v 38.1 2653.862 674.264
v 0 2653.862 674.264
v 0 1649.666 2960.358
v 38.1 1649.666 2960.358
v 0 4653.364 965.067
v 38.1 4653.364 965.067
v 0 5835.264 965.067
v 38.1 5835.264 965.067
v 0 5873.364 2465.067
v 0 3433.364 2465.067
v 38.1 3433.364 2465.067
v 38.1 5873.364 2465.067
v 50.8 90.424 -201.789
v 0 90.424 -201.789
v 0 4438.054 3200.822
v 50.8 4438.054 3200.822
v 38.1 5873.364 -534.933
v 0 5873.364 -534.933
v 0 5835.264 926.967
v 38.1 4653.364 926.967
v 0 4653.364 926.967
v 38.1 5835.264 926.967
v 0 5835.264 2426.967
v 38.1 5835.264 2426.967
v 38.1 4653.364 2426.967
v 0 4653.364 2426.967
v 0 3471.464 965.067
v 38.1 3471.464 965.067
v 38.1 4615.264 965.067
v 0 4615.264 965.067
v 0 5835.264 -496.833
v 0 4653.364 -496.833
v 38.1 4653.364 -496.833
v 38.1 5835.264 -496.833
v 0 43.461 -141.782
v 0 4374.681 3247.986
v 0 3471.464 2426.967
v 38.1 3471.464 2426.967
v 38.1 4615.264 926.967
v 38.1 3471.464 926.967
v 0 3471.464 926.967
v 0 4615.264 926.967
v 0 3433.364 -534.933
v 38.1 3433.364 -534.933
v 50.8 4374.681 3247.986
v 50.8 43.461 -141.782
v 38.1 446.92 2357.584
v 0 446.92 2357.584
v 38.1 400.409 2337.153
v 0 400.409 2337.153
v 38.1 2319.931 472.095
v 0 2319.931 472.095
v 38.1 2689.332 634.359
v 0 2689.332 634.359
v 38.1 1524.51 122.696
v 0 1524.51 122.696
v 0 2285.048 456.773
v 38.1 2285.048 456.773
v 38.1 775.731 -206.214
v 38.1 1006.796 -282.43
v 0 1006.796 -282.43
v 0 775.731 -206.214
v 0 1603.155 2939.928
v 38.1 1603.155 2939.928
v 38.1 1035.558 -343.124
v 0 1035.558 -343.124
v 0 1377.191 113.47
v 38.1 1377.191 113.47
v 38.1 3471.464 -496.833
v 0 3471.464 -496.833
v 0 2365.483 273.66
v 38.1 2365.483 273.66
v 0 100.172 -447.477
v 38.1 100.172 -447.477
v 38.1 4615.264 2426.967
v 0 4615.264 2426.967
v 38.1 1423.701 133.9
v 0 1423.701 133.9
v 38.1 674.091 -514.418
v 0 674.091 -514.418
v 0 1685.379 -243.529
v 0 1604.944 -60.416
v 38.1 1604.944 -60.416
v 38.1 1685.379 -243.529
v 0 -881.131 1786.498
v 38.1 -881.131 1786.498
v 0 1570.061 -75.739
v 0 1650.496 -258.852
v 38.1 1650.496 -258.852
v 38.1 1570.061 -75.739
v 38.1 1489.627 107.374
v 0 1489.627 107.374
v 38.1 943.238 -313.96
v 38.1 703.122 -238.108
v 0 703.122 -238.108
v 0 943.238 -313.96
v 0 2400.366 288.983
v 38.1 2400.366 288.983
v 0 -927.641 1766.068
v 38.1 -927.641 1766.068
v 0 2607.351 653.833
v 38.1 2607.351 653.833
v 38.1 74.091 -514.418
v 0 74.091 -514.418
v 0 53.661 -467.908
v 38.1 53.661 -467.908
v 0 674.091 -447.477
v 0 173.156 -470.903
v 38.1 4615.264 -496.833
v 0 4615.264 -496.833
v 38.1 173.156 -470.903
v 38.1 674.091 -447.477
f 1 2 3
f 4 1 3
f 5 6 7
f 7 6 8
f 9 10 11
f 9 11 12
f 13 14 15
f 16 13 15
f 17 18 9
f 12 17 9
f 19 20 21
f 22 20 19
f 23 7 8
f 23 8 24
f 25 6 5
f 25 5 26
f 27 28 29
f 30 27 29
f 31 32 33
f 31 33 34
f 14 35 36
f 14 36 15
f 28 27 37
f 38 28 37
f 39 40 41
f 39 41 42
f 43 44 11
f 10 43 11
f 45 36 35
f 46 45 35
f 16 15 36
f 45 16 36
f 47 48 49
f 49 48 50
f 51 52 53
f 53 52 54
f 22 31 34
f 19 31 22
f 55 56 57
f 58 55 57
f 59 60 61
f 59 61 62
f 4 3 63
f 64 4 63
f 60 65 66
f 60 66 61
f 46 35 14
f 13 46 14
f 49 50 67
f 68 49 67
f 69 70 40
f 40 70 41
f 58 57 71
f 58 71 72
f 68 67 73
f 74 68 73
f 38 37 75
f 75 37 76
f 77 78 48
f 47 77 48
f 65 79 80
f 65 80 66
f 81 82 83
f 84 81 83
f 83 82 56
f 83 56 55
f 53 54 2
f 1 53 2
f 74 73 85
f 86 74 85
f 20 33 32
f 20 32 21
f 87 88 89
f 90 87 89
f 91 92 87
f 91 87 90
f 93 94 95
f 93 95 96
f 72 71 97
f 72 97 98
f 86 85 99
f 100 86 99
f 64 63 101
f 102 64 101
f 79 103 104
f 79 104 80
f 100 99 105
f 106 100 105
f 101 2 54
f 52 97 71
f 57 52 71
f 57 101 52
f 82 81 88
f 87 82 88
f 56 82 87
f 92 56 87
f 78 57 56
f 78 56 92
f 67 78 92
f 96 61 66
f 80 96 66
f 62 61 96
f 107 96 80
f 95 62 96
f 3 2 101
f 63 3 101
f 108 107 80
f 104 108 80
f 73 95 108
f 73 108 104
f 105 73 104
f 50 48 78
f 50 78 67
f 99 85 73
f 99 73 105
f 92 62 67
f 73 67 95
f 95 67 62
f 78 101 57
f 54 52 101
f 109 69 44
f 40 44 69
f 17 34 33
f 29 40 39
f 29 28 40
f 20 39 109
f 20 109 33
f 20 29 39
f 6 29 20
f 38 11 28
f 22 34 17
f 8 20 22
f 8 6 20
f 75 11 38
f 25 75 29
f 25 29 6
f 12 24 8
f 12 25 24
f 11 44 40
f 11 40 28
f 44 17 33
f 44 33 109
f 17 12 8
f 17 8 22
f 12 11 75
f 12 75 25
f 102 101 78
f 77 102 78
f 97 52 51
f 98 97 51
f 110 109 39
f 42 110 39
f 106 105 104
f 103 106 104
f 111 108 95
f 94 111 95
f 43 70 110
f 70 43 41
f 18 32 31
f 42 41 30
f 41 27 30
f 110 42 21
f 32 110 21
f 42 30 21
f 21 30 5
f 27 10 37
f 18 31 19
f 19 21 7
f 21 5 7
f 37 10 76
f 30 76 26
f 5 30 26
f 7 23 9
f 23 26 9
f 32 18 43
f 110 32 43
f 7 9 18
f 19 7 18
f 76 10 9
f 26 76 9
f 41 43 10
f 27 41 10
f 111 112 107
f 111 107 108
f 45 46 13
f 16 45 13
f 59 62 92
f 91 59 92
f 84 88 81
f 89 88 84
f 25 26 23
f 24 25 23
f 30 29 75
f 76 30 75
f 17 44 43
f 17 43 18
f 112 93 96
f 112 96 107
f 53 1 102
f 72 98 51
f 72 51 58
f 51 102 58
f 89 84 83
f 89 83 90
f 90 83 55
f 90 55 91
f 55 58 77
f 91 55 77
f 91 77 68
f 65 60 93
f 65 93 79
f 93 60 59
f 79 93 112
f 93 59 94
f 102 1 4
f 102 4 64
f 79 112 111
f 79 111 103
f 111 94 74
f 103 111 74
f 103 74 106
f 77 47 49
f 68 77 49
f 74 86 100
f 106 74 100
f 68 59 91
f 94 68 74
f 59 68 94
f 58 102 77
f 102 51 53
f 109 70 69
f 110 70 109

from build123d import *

# Parameters (mm, degrees)
F0_W      = 2440
F0_H      = 3000
F0_W_2    = 2363.8
F0_H_2    = 2923.8
F1_DEPTH  = 38.1
F2_W      = 38.1
F2_H      = 3000
F3_DEPTH  = 38.1
F4_W      = 2440
F4_H      = 38.1
F5_DEPTH  = 38.1
F7_DEPTH  = 38.1
F9_DEPTH  = 38.1
F10_DEPTH = 38.1
F11_W     = 38.1
F11_H     = 38.1
F12_DEPTH = 200
F13_W     = 38.1
F13_H     = 38.1
F14_DEPTH = 200
F16_DEPTH = 50.8


# Not quite as in the source:
# - a feature names something its author has since deleted; it is built from what else it names


with BuildPart() as f1:
    # F0 (on Right) → F1 (new body)
    with BuildSketch(Plane.YZ):
        with Locations((4653.3635152385, 965.0668048064)):
            Rectangle(F0_W, F0_H)
        with Locations((4653.3635152385, 965.0668048064)):
            Rectangle(F0_W_2, F0_H_2, mode=Mode.SUBTRACT)
    extrude(amount=F1_DEPTH)

    # F2 (on face) → F3 (join)
    with BuildSketch(Plane.YZ.offset(38.1)):
        with Locations((4634.3135152385, 965.0668048064)):
            Rectangle(F2_W, F2_H)
    extrude(amount=-F3_DEPTH)

    # F4 (on face) → F5 (join)
    with BuildSketch(Plane.YZ.offset(38.1)):
        with Locations((4653.3635152385, 946.0168048064)):
            Rectangle(F4_W, F4_H)
    extrude(amount=-F5_DEPTH)


with BuildPart() as f7:
    # F6 (on Right) → F7 (new body)
    with BuildSketch(Plane.YZ):
        Polygon((74.091359973, -514.4183039665), (2689.3315110135, 634.3592099591), (2653.8618600197, 674.2636581614), (2607.3512244074, 653.8332696449), (1423.7013476008, 133.8999999239), (1377.1907119885, 113.4696114073), (100.1716070687, -447.4772798376), (109.1459151908, -467.9076683542), align=None)
        Polygon((53.6609714564, -467.9076683542), (74.091359973, -514.4183039665), (109.1459151908, -467.9076683542), (100.1716070687, -447.4772798376), align=None)
        Polygon((2607.3512244074, 653.8332696449), (2653.8618600197, 674.2636581614), (1649.6657982272, 2960.358074601), (1603.1551626149, 2939.9276860845), align=None)
        Polygon((-927.6411541415, 1766.0677429467), (53.6609714564, -467.9076683542), (100.1716070687, -447.4772798376), (-881.1305185292, 1786.4981314632), align=None)
        Polygon((1377.1907119885, 113.4696114073), (1423.7013476008, 133.8999999239), (446.9199455077, 2357.5837947211), (400.4093098953, 2337.1534062045), align=None)
    extrude(amount=F7_DEPTH)

    # F8 (on face) → F9 (join)
    with BuildSketch(Plane.YZ.offset(38.1)):
        Polygon((943.2376147162, -313.9598791054), (1035.5579565697, -343.1235301269), (1006.796002388, -282.4299931526), align=None)
        Polygon((173.1557213069, -470.9030227077), (74.091359973, -514.4183039665), (674.091359973, -514.4183039665), (674.091359973, -447.4772798376), align=None)
        Polygon((674.091359973, -447.4772798376), (674.091359973, -514.4183039665), (1035.5579565697, -343.1235301269), (943.2376147162, -313.9598791054), align=None)
    extrude(amount=-F9_DEPTH)

    # F8 (on face) → F10 (join)
    with BuildSketch(Plane.YZ.offset(38.1)):
        Polygon((674.091359973, -447.4772798376), (674.091359973, -514.4183039665), (1035.5579565697, -343.1235301269), (943.2376147162, -313.9598791054), align=None)
        Polygon((943.2376147162, -313.9598791054), (1035.5579565697, -343.1235301269), (1006.796002388, -282.4299931526), align=None)
        Polygon((703.1224470539, -238.1083948703), (943.2376147162, -313.9598791054), (1006.796002388, -282.4299931526), (775.7308186411, -206.2142437466), align=None)
    extrude(amount=-F10_DEPTH)

    # F11 (on face) → F12 (join)
    with BuildSketch(Plane(origin=(0, 201.4003034253, -458.4962306145), x_dir=(1, 0, 0), z_dir=(0, 0.4021730023, -0.9155636932))):
        with Locations((19.05, -1426.0808250427)):
            Rectangle(F11_W, F11_H)
        with Locations((19.05, -2294.8585769653)):
            Rectangle(F11_W, F11_H)
    extrude(amount=F12_DEPTH)

    # F13 (on face) → F14 (join)
    with BuildSketch(Plane(origin=(0, 281.8349038841, -641.6089692457), x_dir=(1, 0, 0), z_dir=(0, 0.4021730023, -0.9155636932))):
        with Locations((19.05, -1426.0808250427)):
            Rectangle(F13_W, F13_H)
    extrude(amount=F14_DEPTH)


with BuildPart() as f16:
    # F15 (on Right) → F16 (new body)
    with BuildSketch(Plane.YZ):
        Polygon((90.4242247343, -201.7892897129), (4438.0540736265, 3200.8221953591), (4374.6806999502, 3247.9864848224), (43.4605203704, -141.7822028613), align=None)
    extrude(amount=F16_DEPTH)


solid = Compound([f1.part, f7.part, f16.part])
